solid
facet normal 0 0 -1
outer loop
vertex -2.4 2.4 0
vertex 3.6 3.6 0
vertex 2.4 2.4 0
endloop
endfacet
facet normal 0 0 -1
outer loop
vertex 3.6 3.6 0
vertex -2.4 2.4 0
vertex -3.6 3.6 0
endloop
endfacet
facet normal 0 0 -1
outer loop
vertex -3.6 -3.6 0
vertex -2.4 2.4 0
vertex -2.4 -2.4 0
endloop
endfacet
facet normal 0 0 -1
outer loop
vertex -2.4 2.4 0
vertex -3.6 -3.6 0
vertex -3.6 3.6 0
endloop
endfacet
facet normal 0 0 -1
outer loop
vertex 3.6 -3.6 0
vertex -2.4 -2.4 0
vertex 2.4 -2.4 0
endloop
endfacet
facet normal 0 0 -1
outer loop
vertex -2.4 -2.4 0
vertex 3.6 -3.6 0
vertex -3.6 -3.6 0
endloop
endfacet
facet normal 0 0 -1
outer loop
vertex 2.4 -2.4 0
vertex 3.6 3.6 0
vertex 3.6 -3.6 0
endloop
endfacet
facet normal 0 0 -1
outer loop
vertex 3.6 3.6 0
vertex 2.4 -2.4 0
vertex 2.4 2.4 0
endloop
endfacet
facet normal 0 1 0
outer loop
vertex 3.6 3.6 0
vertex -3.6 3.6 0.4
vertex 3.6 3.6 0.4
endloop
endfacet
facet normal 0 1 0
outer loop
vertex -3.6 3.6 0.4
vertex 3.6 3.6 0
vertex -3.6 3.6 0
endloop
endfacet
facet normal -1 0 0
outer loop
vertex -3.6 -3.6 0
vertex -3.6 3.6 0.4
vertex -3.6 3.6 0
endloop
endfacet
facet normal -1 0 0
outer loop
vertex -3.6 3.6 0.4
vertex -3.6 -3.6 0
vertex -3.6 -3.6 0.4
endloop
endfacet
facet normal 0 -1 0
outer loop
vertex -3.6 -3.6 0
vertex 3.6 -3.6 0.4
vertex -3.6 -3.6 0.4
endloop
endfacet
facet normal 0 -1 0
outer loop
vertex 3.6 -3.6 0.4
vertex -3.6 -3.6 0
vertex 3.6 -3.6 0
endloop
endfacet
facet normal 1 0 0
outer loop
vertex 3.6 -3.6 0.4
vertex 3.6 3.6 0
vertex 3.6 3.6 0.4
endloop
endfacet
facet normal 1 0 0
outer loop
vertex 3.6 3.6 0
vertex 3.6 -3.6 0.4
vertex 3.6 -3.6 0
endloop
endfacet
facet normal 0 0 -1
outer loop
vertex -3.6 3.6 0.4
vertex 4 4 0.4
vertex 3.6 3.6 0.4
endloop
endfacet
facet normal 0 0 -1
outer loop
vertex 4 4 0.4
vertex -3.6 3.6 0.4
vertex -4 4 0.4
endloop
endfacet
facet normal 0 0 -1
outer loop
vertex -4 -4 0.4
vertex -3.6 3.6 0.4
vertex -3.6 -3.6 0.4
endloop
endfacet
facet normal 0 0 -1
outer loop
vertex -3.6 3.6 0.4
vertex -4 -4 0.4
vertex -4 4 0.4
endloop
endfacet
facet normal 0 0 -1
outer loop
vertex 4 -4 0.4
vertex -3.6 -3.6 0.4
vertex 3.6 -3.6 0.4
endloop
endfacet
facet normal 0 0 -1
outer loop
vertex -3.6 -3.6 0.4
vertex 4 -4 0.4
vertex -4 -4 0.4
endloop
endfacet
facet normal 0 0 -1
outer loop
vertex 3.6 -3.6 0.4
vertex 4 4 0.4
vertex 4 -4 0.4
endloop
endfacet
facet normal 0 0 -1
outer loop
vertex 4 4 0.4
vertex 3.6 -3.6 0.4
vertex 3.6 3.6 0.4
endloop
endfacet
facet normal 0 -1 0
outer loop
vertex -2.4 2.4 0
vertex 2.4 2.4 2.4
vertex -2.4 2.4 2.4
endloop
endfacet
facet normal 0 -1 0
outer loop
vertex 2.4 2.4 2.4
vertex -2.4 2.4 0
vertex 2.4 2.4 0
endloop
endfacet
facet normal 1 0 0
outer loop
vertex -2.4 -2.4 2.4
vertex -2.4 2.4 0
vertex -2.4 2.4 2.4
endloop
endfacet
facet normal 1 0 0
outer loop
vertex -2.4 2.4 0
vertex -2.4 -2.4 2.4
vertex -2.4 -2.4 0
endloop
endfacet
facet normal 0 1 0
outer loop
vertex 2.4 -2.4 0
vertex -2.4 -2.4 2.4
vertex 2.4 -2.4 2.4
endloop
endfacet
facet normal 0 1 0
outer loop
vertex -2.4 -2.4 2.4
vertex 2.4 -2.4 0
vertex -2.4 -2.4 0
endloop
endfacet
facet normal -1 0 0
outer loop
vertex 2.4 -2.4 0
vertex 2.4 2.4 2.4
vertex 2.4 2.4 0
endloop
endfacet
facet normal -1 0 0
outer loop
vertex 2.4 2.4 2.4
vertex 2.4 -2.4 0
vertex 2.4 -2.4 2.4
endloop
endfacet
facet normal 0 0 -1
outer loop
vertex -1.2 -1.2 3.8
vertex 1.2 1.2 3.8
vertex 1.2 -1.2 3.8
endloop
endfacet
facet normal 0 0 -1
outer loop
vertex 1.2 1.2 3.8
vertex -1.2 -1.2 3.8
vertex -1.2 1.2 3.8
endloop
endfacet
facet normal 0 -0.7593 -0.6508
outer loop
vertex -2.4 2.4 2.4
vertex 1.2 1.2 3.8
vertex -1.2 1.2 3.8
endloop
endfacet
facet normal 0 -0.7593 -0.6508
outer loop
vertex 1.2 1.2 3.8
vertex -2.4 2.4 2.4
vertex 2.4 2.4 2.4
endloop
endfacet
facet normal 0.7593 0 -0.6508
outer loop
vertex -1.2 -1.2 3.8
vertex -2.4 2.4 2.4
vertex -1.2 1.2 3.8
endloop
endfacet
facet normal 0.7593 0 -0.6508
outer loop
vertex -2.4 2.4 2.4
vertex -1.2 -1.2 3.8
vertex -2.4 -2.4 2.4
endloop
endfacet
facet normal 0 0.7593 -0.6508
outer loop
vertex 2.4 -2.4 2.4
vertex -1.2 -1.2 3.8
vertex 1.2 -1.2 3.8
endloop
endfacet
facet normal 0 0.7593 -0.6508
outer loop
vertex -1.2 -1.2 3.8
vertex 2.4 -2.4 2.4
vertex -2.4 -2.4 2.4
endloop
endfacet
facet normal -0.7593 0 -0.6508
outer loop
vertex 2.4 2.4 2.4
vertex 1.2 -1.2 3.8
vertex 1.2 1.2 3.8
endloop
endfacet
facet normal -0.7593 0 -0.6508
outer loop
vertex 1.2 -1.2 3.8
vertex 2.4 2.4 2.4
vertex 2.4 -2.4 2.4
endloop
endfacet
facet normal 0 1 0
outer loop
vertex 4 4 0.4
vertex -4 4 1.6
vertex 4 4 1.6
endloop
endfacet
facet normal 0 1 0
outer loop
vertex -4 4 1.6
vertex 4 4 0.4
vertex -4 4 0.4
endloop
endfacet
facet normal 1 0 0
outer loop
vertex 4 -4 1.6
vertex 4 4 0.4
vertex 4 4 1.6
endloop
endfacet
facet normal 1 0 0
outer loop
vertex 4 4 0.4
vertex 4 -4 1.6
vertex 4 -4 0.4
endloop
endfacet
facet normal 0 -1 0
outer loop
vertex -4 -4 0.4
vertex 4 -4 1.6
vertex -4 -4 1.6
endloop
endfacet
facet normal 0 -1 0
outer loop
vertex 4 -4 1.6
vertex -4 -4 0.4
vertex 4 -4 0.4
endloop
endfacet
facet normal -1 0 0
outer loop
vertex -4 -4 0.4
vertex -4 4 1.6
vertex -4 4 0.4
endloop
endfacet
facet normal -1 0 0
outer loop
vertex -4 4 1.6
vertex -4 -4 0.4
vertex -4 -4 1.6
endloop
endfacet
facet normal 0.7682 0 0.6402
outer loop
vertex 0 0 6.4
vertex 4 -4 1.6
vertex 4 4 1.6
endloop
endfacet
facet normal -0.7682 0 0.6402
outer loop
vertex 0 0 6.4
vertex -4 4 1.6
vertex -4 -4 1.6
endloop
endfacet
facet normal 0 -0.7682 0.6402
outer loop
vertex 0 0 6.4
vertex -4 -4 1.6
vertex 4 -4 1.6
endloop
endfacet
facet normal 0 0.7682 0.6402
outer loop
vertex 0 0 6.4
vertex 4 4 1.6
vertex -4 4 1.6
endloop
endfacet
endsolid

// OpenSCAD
// file: ../p/triangle.scad
use <../lib.scad>
function ldraw_lib__triangle() = [
// 0 Triangle
// 0 Name: triangle.dat
// 0 Author: Steffen [Steffen]
// 0 !LDRAW_ORG Primitive UPDATE 2013-01
// 0 !LICENSE Licensed under CC BY 4.0 : see CAreadme.txt
// 
// 0 BFC CERTIFY CCW
  [0,"BFC","CERTIFY"],
  [0,"BFC","CCW"],
// 
// 0 !HISTORY 2013-07-21 [PTadmin] Official Update 2013-01
// 
// 
// 3 16 0 0 0 1 0 0 0 0 1
  [3,16,0,0,0,1,0,0,0,0,1],
// 2 24 0 0 0 1 0 0
  [2,24,0,0,0,1,0,0],
// 2 24 1 0 0 0 0 1
  [2,24,1,0,0,0,0,1],
// 2 24 0 0 1 0 0 0
  [2,24,0,0,1,0,0,0],
];
module ldraw_lib__triangle(step=0, col=false, unit=2/5, alt=false, line=0.2, solid=!$preview)
    makepoly(ldraw_lib__triangle(), step=step, col=col, unit=unit, alt=alt, line=line, solid=solid);
ldraw_lib__triangle(line=0.2);
// file: ../p/rect.scad
use <../lib.scad>
function ldraw_lib__rect() = [
// 0 Rectangle
// 0 Name: rect.dat
// 0 Author: James Jessiman
// 0 !LDRAW_ORG Primitive UPDATE 2010-01
// 0 !LICENSE Licensed under CC BY 2.0 and CC BY 4.0 : see CAreadme.txt
// 
// 0 BFC CERTIFY CCW
  [0,"BFC","CERTIFY"],
  [0,"BFC","CCW"],
// 
// 0 !HISTORY 2002-04-05 [hafhead] Added BFC statement
// 0 !HISTORY 2002-04-25 [PTadmin] Official Update 2002-02
// 0 !HISTORY 2007-06-24 [PTadmin] Header formatted for Contributor Agreement
// 0 !HISTORY 2008-07-01 [PTadmin] Official Update 2008-01
// 0 !HISTORY 2010-01-17 [mikeheide] changed winding to CCW
// 0 !HISTORY 2010-04-05 [PTadmin] Official Update 2010-01
// 
// 
// 2 24 1 0 1 -1 0 1
  [2,24,1,0,1,-1,0,1],
// 2 24 -1 0 1 -1 0 -1
  [2,24,-1,0,1,-1,0,-1],
// 2 24 -1 0 -1 1 0 -1
  [2,24,-1,0,-1,1,0,-1],
// 2 24 1 0 -1 1 0 1
  [2,24,1,0,-1,1,0,1],
// 4 16 -1 0 1 -1 0 -1 1 0 -1 1 0 1
  [4,16,-1,0,1,-1,0,-1,1,0,-1,1,0,1],
// 0
];
module ldraw_lib__rect(step=0, col=false, unit=2/5, alt=false, line=0.2, solid=!$preview)
    makepoly(ldraw_lib__rect(), step=step, col=col, unit=unit, alt=alt, line=line, solid=solid);
ldraw_lib__rect(line=0.2);
// file: ../p/box4o4a.scad
use <../lib.scad>
function ldraw_lib__box4o4a() = [
// 0 Box with 4 Faces (2 Parallel Pairs) without Bottom Edges
// 0 Name: box4o4a.dat
// 0 Author: Donald Sutter [technog]
// 0 !LDRAW_ORG Primitive UPDATE 2012-01
// 0 !LICENSE Licensed under CC BY 4.0 : see CAreadme.txt
// 
// 0 BFC CERTIFY CCW
  [0,"BFC","CERTIFY"],
  [0,"BFC","CCW"],
// 
// 0 !HISTORY 2003-08-01 [PTadmin] Official Update 2003-02
// 0 !HISTORY 2007-06-24 [PTadmin] Header formatted for Contributor Agreement
// 0 !HISTORY 2008-07-01 [PTadmin] Official Update 2008-01
// 0 !HISTORY 2012-02-16 [Philo] Changed to CCW
// 0 !HISTORY 2012-03-30 [PTadmin] Official Update 2012-01
// 
// 
// 2 24 1 0 1 -1 0 1
  [2,24,1,0,1,-1,0,1],
// 2 24 -1 0 1 -1 0 -1
  [2,24,-1,0,1,-1,0,-1],
// 2 24 -1 0 -1 1 0 -1
  [2,24,-1,0,-1,1,0,-1],
// 2 24 1 0 -1 1 0 1
  [2,24,1,0,-1,1,0,1],
// 2 24 1 0 1 1 1 1
  [2,24,1,0,1,1,1,1],
// 2 24 -1 0 1 -1 1 1
  [2,24,-1,0,1,-1,1,1],
// 2 24 1 0 -1 1 1 -1
  [2,24,1,0,-1,1,1,-1],
// 2 24 -1 0 -1 -1 1 -1
  [2,24,-1,0,-1,-1,1,-1],
// 4 16 -1 1 1 -1 0 1 1 0 1 1 1 1
  [4,16,-1,1,1,-1,0,1,1,0,1,1,1,1],
// 4 16 -1 1 -1 -1 0 -1 -1 0 1 -1 1 1
  [4,16,-1,1,-1,-1,0,-1,-1,0,1,-1,1,1],
// 4 16 1 1 -1 1 0 -1 -1 0 -1 -1 1 -1
  [4,16,1,1,-1,1,0,-1,-1,0,-1,-1,1,-1],
// 4 16 1 1 1 1 0 1 1 0 -1 1 1 -1
  [4,16,1,1,1,1,0,1,1,0,-1,1,1,-1],
];
module ldraw_lib__box4o4a(step=0, col=false, unit=2/5, alt=false, line=0.2, solid=!$preview)
    makepoly(ldraw_lib__box4o4a(), step=step, col=col, unit=unit, alt=alt, line=line, solid=solid);
ldraw_lib__box4o4a(line=0.2);
// file: ../p/box4.scad
use <../lib.scad>
function ldraw_lib__box4() = [
// 0 Box with 4 Faces (2 Parallel Pairs) and All Edges
// 0 Name: box4.dat
// 0 Author: James Jessiman
// 0 !LDRAW_ORG Primitive UPDATE 2012-01
// 0 !LICENSE Licensed under CC BY 4.0 : see CAreadme.txt
// 
// 0 BFC CERTIFY CCW
  [0,"BFC","CERTIFY"],
  [0,"BFC","CCW"],
// 
// 0 !HISTORY 2002-04-03 [sbliss] Modified for BFC compliance
// 0 !HISTORY 2002-04-25 [PTadmin] Official Update 2002-02
// 0 !HISTORY 2007-06-24 [PTadmin] Header formatted for Contributor Agreement
// 0 !HISTORY 2008-07-01 [PTadmin] Official Update 2008-01
// 0 !HISTORY 2012-02-16 [Philo] Changed to CCW
// 0 !HISTORY 2012-03-30 [PTadmin] Official Update 2012-01
// 
// 
// 2 24 1 1 1 -1 1 1
  [2,24,1,1,1,-1,1,1],
// 2 24 -1 1 1 -1 1 -1
  [2,24,-1,1,1,-1,1,-1],
// 2 24 -1 1 -1 1 1 -1
  [2,24,-1,1,-1,1,1,-1],
// 2 24 1 1 -1 1 1 1
  [2,24,1,1,-1,1,1,1],
// 2 24 1 0 1 -1 0 1
  [2,24,1,0,1,-1,0,1],
// 2 24 -1 0 1 -1 0 -1
  [2,24,-1,0,1,-1,0,-1],
// 2 24 -1 0 -1 1 0 -1
  [2,24,-1,0,-1,1,0,-1],
// 2 24 1 0 -1 1 0 1
  [2,24,1,0,-1,1,0,1],
// 2 24 1 0 1 1 1 1
  [2,24,1,0,1,1,1,1],
// 2 24 -1 0 1 -1 1 1
  [2,24,-1,0,1,-1,1,1],
// 2 24 1 0 -1 1 1 -1
  [2,24,1,0,-1,1,1,-1],
// 2 24 -1 0 -1 -1 1 -1
  [2,24,-1,0,-1,-1,1,-1],
// 4 16 -1 1 1 -1 0 1 1 0 1 1 1 1
  [4,16,-1,1,1,-1,0,1,1,0,1,1,1,1],
// 4 16 -1 1 -1 -1 0 -1 -1 0 1 -1 1 1
  [4,16,-1,1,-1,-1,0,-1,-1,0,1,-1,1,1],
// 4 16 1 1 -1 1 0 -1 -1 0 -1 -1 1 -1
  [4,16,1,1,-1,1,0,-1,-1,0,-1,-1,1,-1],
// 4 16 1 1 1 1 0 1 1 0 -1 1 1 -1
  [4,16,1,1,1,1,0,1,1,0,-1,1,1,-1],
];
module ldraw_lib__box4(step=0, col=false, unit=2/5, alt=false, line=0.2, solid=!$preview)
    makepoly(ldraw_lib__box4(), step=step, col=col, unit=unit, alt=alt, line=line, solid=solid);
ldraw_lib__box4(line=0.2);
// file: 22388.scad
use <../lib.scad>
use <../p/box4.scad>
use <../p/box4o4a.scad>
use <../p/rect.scad>
use <../p/triangle.scad>
function ldraw_lib__22388() = [
// 0 Slope Brick 50  1 x  1 x  0.667 Quadruple
// 0 Name: 22388.dat
// 0 Author: Magnus Forsberg [MagFors]
// 0 !LDRAW_ORG Part UPDATE 2016-01
// 0 !LICENSE Licensed under CC BY 4.0 : see CAreadme.txt
// 
// 0 BFC CERTIFY CCW
  [0,"BFC","CERTIFY"],
  [0,"BFC","CCW"],
// 
// 0 !HISTORY 2016-12-31 [PTadmin] Official Update 2016-01
// 
// 
// 4 16 9 0 9 6 0 6 -6 0 6 -9 0 9
  [4,16,9,0,9,6,0,6,-6,0,6,-9,0,9],
// 4 16 -9 0 9 -6 0 6 -6 0 -6 -9 0 -9
  [4,16,-9,0,9,-6,0,6,-6,0,-6,-9,0,-9],
// 4 16 -9 0 -9 -6 0 -6 6 0 -6 9 0 -9
  [4,16,-9,0,-9,-6,0,-6,6,0,-6,9,0,-9],
// 4 16 9 0 -9 6 0 -6 6 0 6 9 0 9
  [4,16,9,0,-9,6,0,-6,6,0,6,9,0,9],
// 1 16 0 -1 0 9 0 0 0 1 0 0 0 9 box4.dat
  [1,16,0,-1,0,9,0,0,0,1,0,0,0,9, ldraw_lib__box4()],
// 4 16 10 -1 10 9 -1 9 -9 -1 9 -10 -1 10
  [4,16,10,-1,10,9,-1,9,-9,-1,9,-10,-1,10],
// 4 16 -10 -1 10 -9 -1 9 -9 -1 -9 -10 -1 -10
  [4,16,-10,-1,10,-9,-1,9,-9,-1,-9,-10,-1,-10],
// 4 16 -10 -1 -10 -9 -1 -9 9 -1 -9 10 -1 -10
  [4,16,-10,-1,-10,-9,-1,-9,9,-1,-9,10,-1,-10],
// 4 16 10 -1 -10 9 -1 -9 9 -1 9 10 -1 10
  [4,16,10,-1,-10,9,-1,-9,9,-1,9,10,-1,10],
// 0 BFC INVERTNEXT
  [0,"BFC","INVERTNEXT"],
// 1 16 0 0 0 6 0 0 0 -6 0 0 0 6 box4.dat
  [1,16,0,0,0,6,0,0,0,-6,0,0,0,6, ldraw_lib__box4()],
// 1 16 0 -9.5 0 -3 0 0 0 -1 0 0 0 3 rect.dat
  [1,16,0,-9.5,0,-3,0,0,0,-1,0,0,0,3, ldraw_lib__rect()],
// 2 24 6 -6 6 3 -9.5 3
  [2,24,6,-6,6,3,-9.5,3],
// 2 24 -6 -6 6 -3 -9.5 3
  [2,24,-6,-6,6,-3,-9.5,3],
// 2 24 -6 -6 -6 -3 -9.5 -3
  [2,24,-6,-6,-6,-3,-9.5,-3],
// 2 24 6 -6 -6 3 -9.5 -3
  [2,24,6,-6,-6,3,-9.5,-3],
// 4 16 6 -6 6 3 -9.5 3 -3 -9.5 3 -6 -6 6
  [4,16,6,-6,6,3,-9.5,3,-3,-9.5,3,-6,-6,6],
// 4 16 -6 -6 6 -3 -9.5 3 -3 -9.5 -3 -6 -6 -6
  [4,16,-6,-6,6,-3,-9.5,3,-3,-9.5,-3,-6,-6,-6],
// 4 16 -6 -6 -6 -3 -9.5 -3 3 -9.5 -3 6 -6 -6
  [4,16,-6,-6,-6,-3,-9.5,-3,3,-9.5,-3,6,-6,-6],
// 4 16 6 -6 -6 3 -9.5 -3 3 -9.5 3 6 -6 6
  [4,16,6,-6,-6,3,-9.5,-3,3,-9.5,3,6,-6,6],
// 1 16 0 -1 0 -10 0 0 0 -3 0 0 0 10 box4o4a.dat
  [1,16,0,-1,0,-10,0,0,0,-3,0,0,0,10, ldraw_lib__box4o4a()],
// 1 16 0 -16 0 10 0 10 12 1 12 -10 0 10 triangle.dat
  [1,16,0,-16,0,10,0,10,12,1,12,-10,0,10, ldraw_lib__triangle()],
// 1 16 0 -16 0 -10 0 -10 12 1 12 10 0 -10 triangle.dat
  [1,16,0,-16,0,-10,0,-10,12,1,12,10,0,-10, ldraw_lib__triangle()],
// 2 24 -10 -4 -10 10 -4 -10
  [2,24,-10,-4,-10,10,-4,-10],
// 2 24 10 -4 10 -10 -4 10
  [2,24,10,-4,10,-10,-4,10],
// 3 16 0 -16 0 -10 -4 -10 10 -4 -10
  [3,16,0,-16,0,-10,-4,-10,10,-4,-10],
// 3 16 0 -16 0 10 -4 10 -10 -4 10
  [3,16,0,-16,0,10,-4,10,-10,-4,10],
];
module ldraw_lib__22388(step=0, col=false, unit=2/5, alt=false, line=0.2, solid=!$preview)
    makepoly(ldraw_lib__22388(), step=step, col=col, unit=unit, alt=alt, line=line, solid=solid);
ldraw_lib__22388(line=0.2);
// main file
use <../lib.scad>
use <22388.scad>
function ldraw_lib__35343() = [
// 0 =Slope Brick 50  1 x  1 x  0.667 Quadruple
// 0 Name: 35343.dat
// 0 Author: Massimo Maso [Sirio]
// 0 !LDRAW_ORG Part Alias UPDATE 2019-02
// 0 !LICENSE Licensed under CC BY 4.0 : see CAreadme.txt
// 
// 0 BFC CERTIFY CW
  [0,"BFC","CERTIFY"],
  [0,"BFC","CW"],
// 
// 0 !HISTORY 2019-09-09 [PTadmin] Official Update 2019-02
// 
// 
// 0 // Alias of 22388
// 1 16 0 0 0 1 0 0 0 1 0 0 0 1 22388.dat
  [1,16,0,0,0,1,0,0,0,1,0,0,0,1, ldraw_lib__22388()],
];
module ldraw_lib__35343(step=0, col=false, unit=2/5, alt=false, line=0.2, solid=!$preview)
    makepoly(ldraw_lib__35343(), step=step, col=col, unit=unit, alt=alt, line=line, solid=solid);
ldraw_lib__35343(line=0.2);
